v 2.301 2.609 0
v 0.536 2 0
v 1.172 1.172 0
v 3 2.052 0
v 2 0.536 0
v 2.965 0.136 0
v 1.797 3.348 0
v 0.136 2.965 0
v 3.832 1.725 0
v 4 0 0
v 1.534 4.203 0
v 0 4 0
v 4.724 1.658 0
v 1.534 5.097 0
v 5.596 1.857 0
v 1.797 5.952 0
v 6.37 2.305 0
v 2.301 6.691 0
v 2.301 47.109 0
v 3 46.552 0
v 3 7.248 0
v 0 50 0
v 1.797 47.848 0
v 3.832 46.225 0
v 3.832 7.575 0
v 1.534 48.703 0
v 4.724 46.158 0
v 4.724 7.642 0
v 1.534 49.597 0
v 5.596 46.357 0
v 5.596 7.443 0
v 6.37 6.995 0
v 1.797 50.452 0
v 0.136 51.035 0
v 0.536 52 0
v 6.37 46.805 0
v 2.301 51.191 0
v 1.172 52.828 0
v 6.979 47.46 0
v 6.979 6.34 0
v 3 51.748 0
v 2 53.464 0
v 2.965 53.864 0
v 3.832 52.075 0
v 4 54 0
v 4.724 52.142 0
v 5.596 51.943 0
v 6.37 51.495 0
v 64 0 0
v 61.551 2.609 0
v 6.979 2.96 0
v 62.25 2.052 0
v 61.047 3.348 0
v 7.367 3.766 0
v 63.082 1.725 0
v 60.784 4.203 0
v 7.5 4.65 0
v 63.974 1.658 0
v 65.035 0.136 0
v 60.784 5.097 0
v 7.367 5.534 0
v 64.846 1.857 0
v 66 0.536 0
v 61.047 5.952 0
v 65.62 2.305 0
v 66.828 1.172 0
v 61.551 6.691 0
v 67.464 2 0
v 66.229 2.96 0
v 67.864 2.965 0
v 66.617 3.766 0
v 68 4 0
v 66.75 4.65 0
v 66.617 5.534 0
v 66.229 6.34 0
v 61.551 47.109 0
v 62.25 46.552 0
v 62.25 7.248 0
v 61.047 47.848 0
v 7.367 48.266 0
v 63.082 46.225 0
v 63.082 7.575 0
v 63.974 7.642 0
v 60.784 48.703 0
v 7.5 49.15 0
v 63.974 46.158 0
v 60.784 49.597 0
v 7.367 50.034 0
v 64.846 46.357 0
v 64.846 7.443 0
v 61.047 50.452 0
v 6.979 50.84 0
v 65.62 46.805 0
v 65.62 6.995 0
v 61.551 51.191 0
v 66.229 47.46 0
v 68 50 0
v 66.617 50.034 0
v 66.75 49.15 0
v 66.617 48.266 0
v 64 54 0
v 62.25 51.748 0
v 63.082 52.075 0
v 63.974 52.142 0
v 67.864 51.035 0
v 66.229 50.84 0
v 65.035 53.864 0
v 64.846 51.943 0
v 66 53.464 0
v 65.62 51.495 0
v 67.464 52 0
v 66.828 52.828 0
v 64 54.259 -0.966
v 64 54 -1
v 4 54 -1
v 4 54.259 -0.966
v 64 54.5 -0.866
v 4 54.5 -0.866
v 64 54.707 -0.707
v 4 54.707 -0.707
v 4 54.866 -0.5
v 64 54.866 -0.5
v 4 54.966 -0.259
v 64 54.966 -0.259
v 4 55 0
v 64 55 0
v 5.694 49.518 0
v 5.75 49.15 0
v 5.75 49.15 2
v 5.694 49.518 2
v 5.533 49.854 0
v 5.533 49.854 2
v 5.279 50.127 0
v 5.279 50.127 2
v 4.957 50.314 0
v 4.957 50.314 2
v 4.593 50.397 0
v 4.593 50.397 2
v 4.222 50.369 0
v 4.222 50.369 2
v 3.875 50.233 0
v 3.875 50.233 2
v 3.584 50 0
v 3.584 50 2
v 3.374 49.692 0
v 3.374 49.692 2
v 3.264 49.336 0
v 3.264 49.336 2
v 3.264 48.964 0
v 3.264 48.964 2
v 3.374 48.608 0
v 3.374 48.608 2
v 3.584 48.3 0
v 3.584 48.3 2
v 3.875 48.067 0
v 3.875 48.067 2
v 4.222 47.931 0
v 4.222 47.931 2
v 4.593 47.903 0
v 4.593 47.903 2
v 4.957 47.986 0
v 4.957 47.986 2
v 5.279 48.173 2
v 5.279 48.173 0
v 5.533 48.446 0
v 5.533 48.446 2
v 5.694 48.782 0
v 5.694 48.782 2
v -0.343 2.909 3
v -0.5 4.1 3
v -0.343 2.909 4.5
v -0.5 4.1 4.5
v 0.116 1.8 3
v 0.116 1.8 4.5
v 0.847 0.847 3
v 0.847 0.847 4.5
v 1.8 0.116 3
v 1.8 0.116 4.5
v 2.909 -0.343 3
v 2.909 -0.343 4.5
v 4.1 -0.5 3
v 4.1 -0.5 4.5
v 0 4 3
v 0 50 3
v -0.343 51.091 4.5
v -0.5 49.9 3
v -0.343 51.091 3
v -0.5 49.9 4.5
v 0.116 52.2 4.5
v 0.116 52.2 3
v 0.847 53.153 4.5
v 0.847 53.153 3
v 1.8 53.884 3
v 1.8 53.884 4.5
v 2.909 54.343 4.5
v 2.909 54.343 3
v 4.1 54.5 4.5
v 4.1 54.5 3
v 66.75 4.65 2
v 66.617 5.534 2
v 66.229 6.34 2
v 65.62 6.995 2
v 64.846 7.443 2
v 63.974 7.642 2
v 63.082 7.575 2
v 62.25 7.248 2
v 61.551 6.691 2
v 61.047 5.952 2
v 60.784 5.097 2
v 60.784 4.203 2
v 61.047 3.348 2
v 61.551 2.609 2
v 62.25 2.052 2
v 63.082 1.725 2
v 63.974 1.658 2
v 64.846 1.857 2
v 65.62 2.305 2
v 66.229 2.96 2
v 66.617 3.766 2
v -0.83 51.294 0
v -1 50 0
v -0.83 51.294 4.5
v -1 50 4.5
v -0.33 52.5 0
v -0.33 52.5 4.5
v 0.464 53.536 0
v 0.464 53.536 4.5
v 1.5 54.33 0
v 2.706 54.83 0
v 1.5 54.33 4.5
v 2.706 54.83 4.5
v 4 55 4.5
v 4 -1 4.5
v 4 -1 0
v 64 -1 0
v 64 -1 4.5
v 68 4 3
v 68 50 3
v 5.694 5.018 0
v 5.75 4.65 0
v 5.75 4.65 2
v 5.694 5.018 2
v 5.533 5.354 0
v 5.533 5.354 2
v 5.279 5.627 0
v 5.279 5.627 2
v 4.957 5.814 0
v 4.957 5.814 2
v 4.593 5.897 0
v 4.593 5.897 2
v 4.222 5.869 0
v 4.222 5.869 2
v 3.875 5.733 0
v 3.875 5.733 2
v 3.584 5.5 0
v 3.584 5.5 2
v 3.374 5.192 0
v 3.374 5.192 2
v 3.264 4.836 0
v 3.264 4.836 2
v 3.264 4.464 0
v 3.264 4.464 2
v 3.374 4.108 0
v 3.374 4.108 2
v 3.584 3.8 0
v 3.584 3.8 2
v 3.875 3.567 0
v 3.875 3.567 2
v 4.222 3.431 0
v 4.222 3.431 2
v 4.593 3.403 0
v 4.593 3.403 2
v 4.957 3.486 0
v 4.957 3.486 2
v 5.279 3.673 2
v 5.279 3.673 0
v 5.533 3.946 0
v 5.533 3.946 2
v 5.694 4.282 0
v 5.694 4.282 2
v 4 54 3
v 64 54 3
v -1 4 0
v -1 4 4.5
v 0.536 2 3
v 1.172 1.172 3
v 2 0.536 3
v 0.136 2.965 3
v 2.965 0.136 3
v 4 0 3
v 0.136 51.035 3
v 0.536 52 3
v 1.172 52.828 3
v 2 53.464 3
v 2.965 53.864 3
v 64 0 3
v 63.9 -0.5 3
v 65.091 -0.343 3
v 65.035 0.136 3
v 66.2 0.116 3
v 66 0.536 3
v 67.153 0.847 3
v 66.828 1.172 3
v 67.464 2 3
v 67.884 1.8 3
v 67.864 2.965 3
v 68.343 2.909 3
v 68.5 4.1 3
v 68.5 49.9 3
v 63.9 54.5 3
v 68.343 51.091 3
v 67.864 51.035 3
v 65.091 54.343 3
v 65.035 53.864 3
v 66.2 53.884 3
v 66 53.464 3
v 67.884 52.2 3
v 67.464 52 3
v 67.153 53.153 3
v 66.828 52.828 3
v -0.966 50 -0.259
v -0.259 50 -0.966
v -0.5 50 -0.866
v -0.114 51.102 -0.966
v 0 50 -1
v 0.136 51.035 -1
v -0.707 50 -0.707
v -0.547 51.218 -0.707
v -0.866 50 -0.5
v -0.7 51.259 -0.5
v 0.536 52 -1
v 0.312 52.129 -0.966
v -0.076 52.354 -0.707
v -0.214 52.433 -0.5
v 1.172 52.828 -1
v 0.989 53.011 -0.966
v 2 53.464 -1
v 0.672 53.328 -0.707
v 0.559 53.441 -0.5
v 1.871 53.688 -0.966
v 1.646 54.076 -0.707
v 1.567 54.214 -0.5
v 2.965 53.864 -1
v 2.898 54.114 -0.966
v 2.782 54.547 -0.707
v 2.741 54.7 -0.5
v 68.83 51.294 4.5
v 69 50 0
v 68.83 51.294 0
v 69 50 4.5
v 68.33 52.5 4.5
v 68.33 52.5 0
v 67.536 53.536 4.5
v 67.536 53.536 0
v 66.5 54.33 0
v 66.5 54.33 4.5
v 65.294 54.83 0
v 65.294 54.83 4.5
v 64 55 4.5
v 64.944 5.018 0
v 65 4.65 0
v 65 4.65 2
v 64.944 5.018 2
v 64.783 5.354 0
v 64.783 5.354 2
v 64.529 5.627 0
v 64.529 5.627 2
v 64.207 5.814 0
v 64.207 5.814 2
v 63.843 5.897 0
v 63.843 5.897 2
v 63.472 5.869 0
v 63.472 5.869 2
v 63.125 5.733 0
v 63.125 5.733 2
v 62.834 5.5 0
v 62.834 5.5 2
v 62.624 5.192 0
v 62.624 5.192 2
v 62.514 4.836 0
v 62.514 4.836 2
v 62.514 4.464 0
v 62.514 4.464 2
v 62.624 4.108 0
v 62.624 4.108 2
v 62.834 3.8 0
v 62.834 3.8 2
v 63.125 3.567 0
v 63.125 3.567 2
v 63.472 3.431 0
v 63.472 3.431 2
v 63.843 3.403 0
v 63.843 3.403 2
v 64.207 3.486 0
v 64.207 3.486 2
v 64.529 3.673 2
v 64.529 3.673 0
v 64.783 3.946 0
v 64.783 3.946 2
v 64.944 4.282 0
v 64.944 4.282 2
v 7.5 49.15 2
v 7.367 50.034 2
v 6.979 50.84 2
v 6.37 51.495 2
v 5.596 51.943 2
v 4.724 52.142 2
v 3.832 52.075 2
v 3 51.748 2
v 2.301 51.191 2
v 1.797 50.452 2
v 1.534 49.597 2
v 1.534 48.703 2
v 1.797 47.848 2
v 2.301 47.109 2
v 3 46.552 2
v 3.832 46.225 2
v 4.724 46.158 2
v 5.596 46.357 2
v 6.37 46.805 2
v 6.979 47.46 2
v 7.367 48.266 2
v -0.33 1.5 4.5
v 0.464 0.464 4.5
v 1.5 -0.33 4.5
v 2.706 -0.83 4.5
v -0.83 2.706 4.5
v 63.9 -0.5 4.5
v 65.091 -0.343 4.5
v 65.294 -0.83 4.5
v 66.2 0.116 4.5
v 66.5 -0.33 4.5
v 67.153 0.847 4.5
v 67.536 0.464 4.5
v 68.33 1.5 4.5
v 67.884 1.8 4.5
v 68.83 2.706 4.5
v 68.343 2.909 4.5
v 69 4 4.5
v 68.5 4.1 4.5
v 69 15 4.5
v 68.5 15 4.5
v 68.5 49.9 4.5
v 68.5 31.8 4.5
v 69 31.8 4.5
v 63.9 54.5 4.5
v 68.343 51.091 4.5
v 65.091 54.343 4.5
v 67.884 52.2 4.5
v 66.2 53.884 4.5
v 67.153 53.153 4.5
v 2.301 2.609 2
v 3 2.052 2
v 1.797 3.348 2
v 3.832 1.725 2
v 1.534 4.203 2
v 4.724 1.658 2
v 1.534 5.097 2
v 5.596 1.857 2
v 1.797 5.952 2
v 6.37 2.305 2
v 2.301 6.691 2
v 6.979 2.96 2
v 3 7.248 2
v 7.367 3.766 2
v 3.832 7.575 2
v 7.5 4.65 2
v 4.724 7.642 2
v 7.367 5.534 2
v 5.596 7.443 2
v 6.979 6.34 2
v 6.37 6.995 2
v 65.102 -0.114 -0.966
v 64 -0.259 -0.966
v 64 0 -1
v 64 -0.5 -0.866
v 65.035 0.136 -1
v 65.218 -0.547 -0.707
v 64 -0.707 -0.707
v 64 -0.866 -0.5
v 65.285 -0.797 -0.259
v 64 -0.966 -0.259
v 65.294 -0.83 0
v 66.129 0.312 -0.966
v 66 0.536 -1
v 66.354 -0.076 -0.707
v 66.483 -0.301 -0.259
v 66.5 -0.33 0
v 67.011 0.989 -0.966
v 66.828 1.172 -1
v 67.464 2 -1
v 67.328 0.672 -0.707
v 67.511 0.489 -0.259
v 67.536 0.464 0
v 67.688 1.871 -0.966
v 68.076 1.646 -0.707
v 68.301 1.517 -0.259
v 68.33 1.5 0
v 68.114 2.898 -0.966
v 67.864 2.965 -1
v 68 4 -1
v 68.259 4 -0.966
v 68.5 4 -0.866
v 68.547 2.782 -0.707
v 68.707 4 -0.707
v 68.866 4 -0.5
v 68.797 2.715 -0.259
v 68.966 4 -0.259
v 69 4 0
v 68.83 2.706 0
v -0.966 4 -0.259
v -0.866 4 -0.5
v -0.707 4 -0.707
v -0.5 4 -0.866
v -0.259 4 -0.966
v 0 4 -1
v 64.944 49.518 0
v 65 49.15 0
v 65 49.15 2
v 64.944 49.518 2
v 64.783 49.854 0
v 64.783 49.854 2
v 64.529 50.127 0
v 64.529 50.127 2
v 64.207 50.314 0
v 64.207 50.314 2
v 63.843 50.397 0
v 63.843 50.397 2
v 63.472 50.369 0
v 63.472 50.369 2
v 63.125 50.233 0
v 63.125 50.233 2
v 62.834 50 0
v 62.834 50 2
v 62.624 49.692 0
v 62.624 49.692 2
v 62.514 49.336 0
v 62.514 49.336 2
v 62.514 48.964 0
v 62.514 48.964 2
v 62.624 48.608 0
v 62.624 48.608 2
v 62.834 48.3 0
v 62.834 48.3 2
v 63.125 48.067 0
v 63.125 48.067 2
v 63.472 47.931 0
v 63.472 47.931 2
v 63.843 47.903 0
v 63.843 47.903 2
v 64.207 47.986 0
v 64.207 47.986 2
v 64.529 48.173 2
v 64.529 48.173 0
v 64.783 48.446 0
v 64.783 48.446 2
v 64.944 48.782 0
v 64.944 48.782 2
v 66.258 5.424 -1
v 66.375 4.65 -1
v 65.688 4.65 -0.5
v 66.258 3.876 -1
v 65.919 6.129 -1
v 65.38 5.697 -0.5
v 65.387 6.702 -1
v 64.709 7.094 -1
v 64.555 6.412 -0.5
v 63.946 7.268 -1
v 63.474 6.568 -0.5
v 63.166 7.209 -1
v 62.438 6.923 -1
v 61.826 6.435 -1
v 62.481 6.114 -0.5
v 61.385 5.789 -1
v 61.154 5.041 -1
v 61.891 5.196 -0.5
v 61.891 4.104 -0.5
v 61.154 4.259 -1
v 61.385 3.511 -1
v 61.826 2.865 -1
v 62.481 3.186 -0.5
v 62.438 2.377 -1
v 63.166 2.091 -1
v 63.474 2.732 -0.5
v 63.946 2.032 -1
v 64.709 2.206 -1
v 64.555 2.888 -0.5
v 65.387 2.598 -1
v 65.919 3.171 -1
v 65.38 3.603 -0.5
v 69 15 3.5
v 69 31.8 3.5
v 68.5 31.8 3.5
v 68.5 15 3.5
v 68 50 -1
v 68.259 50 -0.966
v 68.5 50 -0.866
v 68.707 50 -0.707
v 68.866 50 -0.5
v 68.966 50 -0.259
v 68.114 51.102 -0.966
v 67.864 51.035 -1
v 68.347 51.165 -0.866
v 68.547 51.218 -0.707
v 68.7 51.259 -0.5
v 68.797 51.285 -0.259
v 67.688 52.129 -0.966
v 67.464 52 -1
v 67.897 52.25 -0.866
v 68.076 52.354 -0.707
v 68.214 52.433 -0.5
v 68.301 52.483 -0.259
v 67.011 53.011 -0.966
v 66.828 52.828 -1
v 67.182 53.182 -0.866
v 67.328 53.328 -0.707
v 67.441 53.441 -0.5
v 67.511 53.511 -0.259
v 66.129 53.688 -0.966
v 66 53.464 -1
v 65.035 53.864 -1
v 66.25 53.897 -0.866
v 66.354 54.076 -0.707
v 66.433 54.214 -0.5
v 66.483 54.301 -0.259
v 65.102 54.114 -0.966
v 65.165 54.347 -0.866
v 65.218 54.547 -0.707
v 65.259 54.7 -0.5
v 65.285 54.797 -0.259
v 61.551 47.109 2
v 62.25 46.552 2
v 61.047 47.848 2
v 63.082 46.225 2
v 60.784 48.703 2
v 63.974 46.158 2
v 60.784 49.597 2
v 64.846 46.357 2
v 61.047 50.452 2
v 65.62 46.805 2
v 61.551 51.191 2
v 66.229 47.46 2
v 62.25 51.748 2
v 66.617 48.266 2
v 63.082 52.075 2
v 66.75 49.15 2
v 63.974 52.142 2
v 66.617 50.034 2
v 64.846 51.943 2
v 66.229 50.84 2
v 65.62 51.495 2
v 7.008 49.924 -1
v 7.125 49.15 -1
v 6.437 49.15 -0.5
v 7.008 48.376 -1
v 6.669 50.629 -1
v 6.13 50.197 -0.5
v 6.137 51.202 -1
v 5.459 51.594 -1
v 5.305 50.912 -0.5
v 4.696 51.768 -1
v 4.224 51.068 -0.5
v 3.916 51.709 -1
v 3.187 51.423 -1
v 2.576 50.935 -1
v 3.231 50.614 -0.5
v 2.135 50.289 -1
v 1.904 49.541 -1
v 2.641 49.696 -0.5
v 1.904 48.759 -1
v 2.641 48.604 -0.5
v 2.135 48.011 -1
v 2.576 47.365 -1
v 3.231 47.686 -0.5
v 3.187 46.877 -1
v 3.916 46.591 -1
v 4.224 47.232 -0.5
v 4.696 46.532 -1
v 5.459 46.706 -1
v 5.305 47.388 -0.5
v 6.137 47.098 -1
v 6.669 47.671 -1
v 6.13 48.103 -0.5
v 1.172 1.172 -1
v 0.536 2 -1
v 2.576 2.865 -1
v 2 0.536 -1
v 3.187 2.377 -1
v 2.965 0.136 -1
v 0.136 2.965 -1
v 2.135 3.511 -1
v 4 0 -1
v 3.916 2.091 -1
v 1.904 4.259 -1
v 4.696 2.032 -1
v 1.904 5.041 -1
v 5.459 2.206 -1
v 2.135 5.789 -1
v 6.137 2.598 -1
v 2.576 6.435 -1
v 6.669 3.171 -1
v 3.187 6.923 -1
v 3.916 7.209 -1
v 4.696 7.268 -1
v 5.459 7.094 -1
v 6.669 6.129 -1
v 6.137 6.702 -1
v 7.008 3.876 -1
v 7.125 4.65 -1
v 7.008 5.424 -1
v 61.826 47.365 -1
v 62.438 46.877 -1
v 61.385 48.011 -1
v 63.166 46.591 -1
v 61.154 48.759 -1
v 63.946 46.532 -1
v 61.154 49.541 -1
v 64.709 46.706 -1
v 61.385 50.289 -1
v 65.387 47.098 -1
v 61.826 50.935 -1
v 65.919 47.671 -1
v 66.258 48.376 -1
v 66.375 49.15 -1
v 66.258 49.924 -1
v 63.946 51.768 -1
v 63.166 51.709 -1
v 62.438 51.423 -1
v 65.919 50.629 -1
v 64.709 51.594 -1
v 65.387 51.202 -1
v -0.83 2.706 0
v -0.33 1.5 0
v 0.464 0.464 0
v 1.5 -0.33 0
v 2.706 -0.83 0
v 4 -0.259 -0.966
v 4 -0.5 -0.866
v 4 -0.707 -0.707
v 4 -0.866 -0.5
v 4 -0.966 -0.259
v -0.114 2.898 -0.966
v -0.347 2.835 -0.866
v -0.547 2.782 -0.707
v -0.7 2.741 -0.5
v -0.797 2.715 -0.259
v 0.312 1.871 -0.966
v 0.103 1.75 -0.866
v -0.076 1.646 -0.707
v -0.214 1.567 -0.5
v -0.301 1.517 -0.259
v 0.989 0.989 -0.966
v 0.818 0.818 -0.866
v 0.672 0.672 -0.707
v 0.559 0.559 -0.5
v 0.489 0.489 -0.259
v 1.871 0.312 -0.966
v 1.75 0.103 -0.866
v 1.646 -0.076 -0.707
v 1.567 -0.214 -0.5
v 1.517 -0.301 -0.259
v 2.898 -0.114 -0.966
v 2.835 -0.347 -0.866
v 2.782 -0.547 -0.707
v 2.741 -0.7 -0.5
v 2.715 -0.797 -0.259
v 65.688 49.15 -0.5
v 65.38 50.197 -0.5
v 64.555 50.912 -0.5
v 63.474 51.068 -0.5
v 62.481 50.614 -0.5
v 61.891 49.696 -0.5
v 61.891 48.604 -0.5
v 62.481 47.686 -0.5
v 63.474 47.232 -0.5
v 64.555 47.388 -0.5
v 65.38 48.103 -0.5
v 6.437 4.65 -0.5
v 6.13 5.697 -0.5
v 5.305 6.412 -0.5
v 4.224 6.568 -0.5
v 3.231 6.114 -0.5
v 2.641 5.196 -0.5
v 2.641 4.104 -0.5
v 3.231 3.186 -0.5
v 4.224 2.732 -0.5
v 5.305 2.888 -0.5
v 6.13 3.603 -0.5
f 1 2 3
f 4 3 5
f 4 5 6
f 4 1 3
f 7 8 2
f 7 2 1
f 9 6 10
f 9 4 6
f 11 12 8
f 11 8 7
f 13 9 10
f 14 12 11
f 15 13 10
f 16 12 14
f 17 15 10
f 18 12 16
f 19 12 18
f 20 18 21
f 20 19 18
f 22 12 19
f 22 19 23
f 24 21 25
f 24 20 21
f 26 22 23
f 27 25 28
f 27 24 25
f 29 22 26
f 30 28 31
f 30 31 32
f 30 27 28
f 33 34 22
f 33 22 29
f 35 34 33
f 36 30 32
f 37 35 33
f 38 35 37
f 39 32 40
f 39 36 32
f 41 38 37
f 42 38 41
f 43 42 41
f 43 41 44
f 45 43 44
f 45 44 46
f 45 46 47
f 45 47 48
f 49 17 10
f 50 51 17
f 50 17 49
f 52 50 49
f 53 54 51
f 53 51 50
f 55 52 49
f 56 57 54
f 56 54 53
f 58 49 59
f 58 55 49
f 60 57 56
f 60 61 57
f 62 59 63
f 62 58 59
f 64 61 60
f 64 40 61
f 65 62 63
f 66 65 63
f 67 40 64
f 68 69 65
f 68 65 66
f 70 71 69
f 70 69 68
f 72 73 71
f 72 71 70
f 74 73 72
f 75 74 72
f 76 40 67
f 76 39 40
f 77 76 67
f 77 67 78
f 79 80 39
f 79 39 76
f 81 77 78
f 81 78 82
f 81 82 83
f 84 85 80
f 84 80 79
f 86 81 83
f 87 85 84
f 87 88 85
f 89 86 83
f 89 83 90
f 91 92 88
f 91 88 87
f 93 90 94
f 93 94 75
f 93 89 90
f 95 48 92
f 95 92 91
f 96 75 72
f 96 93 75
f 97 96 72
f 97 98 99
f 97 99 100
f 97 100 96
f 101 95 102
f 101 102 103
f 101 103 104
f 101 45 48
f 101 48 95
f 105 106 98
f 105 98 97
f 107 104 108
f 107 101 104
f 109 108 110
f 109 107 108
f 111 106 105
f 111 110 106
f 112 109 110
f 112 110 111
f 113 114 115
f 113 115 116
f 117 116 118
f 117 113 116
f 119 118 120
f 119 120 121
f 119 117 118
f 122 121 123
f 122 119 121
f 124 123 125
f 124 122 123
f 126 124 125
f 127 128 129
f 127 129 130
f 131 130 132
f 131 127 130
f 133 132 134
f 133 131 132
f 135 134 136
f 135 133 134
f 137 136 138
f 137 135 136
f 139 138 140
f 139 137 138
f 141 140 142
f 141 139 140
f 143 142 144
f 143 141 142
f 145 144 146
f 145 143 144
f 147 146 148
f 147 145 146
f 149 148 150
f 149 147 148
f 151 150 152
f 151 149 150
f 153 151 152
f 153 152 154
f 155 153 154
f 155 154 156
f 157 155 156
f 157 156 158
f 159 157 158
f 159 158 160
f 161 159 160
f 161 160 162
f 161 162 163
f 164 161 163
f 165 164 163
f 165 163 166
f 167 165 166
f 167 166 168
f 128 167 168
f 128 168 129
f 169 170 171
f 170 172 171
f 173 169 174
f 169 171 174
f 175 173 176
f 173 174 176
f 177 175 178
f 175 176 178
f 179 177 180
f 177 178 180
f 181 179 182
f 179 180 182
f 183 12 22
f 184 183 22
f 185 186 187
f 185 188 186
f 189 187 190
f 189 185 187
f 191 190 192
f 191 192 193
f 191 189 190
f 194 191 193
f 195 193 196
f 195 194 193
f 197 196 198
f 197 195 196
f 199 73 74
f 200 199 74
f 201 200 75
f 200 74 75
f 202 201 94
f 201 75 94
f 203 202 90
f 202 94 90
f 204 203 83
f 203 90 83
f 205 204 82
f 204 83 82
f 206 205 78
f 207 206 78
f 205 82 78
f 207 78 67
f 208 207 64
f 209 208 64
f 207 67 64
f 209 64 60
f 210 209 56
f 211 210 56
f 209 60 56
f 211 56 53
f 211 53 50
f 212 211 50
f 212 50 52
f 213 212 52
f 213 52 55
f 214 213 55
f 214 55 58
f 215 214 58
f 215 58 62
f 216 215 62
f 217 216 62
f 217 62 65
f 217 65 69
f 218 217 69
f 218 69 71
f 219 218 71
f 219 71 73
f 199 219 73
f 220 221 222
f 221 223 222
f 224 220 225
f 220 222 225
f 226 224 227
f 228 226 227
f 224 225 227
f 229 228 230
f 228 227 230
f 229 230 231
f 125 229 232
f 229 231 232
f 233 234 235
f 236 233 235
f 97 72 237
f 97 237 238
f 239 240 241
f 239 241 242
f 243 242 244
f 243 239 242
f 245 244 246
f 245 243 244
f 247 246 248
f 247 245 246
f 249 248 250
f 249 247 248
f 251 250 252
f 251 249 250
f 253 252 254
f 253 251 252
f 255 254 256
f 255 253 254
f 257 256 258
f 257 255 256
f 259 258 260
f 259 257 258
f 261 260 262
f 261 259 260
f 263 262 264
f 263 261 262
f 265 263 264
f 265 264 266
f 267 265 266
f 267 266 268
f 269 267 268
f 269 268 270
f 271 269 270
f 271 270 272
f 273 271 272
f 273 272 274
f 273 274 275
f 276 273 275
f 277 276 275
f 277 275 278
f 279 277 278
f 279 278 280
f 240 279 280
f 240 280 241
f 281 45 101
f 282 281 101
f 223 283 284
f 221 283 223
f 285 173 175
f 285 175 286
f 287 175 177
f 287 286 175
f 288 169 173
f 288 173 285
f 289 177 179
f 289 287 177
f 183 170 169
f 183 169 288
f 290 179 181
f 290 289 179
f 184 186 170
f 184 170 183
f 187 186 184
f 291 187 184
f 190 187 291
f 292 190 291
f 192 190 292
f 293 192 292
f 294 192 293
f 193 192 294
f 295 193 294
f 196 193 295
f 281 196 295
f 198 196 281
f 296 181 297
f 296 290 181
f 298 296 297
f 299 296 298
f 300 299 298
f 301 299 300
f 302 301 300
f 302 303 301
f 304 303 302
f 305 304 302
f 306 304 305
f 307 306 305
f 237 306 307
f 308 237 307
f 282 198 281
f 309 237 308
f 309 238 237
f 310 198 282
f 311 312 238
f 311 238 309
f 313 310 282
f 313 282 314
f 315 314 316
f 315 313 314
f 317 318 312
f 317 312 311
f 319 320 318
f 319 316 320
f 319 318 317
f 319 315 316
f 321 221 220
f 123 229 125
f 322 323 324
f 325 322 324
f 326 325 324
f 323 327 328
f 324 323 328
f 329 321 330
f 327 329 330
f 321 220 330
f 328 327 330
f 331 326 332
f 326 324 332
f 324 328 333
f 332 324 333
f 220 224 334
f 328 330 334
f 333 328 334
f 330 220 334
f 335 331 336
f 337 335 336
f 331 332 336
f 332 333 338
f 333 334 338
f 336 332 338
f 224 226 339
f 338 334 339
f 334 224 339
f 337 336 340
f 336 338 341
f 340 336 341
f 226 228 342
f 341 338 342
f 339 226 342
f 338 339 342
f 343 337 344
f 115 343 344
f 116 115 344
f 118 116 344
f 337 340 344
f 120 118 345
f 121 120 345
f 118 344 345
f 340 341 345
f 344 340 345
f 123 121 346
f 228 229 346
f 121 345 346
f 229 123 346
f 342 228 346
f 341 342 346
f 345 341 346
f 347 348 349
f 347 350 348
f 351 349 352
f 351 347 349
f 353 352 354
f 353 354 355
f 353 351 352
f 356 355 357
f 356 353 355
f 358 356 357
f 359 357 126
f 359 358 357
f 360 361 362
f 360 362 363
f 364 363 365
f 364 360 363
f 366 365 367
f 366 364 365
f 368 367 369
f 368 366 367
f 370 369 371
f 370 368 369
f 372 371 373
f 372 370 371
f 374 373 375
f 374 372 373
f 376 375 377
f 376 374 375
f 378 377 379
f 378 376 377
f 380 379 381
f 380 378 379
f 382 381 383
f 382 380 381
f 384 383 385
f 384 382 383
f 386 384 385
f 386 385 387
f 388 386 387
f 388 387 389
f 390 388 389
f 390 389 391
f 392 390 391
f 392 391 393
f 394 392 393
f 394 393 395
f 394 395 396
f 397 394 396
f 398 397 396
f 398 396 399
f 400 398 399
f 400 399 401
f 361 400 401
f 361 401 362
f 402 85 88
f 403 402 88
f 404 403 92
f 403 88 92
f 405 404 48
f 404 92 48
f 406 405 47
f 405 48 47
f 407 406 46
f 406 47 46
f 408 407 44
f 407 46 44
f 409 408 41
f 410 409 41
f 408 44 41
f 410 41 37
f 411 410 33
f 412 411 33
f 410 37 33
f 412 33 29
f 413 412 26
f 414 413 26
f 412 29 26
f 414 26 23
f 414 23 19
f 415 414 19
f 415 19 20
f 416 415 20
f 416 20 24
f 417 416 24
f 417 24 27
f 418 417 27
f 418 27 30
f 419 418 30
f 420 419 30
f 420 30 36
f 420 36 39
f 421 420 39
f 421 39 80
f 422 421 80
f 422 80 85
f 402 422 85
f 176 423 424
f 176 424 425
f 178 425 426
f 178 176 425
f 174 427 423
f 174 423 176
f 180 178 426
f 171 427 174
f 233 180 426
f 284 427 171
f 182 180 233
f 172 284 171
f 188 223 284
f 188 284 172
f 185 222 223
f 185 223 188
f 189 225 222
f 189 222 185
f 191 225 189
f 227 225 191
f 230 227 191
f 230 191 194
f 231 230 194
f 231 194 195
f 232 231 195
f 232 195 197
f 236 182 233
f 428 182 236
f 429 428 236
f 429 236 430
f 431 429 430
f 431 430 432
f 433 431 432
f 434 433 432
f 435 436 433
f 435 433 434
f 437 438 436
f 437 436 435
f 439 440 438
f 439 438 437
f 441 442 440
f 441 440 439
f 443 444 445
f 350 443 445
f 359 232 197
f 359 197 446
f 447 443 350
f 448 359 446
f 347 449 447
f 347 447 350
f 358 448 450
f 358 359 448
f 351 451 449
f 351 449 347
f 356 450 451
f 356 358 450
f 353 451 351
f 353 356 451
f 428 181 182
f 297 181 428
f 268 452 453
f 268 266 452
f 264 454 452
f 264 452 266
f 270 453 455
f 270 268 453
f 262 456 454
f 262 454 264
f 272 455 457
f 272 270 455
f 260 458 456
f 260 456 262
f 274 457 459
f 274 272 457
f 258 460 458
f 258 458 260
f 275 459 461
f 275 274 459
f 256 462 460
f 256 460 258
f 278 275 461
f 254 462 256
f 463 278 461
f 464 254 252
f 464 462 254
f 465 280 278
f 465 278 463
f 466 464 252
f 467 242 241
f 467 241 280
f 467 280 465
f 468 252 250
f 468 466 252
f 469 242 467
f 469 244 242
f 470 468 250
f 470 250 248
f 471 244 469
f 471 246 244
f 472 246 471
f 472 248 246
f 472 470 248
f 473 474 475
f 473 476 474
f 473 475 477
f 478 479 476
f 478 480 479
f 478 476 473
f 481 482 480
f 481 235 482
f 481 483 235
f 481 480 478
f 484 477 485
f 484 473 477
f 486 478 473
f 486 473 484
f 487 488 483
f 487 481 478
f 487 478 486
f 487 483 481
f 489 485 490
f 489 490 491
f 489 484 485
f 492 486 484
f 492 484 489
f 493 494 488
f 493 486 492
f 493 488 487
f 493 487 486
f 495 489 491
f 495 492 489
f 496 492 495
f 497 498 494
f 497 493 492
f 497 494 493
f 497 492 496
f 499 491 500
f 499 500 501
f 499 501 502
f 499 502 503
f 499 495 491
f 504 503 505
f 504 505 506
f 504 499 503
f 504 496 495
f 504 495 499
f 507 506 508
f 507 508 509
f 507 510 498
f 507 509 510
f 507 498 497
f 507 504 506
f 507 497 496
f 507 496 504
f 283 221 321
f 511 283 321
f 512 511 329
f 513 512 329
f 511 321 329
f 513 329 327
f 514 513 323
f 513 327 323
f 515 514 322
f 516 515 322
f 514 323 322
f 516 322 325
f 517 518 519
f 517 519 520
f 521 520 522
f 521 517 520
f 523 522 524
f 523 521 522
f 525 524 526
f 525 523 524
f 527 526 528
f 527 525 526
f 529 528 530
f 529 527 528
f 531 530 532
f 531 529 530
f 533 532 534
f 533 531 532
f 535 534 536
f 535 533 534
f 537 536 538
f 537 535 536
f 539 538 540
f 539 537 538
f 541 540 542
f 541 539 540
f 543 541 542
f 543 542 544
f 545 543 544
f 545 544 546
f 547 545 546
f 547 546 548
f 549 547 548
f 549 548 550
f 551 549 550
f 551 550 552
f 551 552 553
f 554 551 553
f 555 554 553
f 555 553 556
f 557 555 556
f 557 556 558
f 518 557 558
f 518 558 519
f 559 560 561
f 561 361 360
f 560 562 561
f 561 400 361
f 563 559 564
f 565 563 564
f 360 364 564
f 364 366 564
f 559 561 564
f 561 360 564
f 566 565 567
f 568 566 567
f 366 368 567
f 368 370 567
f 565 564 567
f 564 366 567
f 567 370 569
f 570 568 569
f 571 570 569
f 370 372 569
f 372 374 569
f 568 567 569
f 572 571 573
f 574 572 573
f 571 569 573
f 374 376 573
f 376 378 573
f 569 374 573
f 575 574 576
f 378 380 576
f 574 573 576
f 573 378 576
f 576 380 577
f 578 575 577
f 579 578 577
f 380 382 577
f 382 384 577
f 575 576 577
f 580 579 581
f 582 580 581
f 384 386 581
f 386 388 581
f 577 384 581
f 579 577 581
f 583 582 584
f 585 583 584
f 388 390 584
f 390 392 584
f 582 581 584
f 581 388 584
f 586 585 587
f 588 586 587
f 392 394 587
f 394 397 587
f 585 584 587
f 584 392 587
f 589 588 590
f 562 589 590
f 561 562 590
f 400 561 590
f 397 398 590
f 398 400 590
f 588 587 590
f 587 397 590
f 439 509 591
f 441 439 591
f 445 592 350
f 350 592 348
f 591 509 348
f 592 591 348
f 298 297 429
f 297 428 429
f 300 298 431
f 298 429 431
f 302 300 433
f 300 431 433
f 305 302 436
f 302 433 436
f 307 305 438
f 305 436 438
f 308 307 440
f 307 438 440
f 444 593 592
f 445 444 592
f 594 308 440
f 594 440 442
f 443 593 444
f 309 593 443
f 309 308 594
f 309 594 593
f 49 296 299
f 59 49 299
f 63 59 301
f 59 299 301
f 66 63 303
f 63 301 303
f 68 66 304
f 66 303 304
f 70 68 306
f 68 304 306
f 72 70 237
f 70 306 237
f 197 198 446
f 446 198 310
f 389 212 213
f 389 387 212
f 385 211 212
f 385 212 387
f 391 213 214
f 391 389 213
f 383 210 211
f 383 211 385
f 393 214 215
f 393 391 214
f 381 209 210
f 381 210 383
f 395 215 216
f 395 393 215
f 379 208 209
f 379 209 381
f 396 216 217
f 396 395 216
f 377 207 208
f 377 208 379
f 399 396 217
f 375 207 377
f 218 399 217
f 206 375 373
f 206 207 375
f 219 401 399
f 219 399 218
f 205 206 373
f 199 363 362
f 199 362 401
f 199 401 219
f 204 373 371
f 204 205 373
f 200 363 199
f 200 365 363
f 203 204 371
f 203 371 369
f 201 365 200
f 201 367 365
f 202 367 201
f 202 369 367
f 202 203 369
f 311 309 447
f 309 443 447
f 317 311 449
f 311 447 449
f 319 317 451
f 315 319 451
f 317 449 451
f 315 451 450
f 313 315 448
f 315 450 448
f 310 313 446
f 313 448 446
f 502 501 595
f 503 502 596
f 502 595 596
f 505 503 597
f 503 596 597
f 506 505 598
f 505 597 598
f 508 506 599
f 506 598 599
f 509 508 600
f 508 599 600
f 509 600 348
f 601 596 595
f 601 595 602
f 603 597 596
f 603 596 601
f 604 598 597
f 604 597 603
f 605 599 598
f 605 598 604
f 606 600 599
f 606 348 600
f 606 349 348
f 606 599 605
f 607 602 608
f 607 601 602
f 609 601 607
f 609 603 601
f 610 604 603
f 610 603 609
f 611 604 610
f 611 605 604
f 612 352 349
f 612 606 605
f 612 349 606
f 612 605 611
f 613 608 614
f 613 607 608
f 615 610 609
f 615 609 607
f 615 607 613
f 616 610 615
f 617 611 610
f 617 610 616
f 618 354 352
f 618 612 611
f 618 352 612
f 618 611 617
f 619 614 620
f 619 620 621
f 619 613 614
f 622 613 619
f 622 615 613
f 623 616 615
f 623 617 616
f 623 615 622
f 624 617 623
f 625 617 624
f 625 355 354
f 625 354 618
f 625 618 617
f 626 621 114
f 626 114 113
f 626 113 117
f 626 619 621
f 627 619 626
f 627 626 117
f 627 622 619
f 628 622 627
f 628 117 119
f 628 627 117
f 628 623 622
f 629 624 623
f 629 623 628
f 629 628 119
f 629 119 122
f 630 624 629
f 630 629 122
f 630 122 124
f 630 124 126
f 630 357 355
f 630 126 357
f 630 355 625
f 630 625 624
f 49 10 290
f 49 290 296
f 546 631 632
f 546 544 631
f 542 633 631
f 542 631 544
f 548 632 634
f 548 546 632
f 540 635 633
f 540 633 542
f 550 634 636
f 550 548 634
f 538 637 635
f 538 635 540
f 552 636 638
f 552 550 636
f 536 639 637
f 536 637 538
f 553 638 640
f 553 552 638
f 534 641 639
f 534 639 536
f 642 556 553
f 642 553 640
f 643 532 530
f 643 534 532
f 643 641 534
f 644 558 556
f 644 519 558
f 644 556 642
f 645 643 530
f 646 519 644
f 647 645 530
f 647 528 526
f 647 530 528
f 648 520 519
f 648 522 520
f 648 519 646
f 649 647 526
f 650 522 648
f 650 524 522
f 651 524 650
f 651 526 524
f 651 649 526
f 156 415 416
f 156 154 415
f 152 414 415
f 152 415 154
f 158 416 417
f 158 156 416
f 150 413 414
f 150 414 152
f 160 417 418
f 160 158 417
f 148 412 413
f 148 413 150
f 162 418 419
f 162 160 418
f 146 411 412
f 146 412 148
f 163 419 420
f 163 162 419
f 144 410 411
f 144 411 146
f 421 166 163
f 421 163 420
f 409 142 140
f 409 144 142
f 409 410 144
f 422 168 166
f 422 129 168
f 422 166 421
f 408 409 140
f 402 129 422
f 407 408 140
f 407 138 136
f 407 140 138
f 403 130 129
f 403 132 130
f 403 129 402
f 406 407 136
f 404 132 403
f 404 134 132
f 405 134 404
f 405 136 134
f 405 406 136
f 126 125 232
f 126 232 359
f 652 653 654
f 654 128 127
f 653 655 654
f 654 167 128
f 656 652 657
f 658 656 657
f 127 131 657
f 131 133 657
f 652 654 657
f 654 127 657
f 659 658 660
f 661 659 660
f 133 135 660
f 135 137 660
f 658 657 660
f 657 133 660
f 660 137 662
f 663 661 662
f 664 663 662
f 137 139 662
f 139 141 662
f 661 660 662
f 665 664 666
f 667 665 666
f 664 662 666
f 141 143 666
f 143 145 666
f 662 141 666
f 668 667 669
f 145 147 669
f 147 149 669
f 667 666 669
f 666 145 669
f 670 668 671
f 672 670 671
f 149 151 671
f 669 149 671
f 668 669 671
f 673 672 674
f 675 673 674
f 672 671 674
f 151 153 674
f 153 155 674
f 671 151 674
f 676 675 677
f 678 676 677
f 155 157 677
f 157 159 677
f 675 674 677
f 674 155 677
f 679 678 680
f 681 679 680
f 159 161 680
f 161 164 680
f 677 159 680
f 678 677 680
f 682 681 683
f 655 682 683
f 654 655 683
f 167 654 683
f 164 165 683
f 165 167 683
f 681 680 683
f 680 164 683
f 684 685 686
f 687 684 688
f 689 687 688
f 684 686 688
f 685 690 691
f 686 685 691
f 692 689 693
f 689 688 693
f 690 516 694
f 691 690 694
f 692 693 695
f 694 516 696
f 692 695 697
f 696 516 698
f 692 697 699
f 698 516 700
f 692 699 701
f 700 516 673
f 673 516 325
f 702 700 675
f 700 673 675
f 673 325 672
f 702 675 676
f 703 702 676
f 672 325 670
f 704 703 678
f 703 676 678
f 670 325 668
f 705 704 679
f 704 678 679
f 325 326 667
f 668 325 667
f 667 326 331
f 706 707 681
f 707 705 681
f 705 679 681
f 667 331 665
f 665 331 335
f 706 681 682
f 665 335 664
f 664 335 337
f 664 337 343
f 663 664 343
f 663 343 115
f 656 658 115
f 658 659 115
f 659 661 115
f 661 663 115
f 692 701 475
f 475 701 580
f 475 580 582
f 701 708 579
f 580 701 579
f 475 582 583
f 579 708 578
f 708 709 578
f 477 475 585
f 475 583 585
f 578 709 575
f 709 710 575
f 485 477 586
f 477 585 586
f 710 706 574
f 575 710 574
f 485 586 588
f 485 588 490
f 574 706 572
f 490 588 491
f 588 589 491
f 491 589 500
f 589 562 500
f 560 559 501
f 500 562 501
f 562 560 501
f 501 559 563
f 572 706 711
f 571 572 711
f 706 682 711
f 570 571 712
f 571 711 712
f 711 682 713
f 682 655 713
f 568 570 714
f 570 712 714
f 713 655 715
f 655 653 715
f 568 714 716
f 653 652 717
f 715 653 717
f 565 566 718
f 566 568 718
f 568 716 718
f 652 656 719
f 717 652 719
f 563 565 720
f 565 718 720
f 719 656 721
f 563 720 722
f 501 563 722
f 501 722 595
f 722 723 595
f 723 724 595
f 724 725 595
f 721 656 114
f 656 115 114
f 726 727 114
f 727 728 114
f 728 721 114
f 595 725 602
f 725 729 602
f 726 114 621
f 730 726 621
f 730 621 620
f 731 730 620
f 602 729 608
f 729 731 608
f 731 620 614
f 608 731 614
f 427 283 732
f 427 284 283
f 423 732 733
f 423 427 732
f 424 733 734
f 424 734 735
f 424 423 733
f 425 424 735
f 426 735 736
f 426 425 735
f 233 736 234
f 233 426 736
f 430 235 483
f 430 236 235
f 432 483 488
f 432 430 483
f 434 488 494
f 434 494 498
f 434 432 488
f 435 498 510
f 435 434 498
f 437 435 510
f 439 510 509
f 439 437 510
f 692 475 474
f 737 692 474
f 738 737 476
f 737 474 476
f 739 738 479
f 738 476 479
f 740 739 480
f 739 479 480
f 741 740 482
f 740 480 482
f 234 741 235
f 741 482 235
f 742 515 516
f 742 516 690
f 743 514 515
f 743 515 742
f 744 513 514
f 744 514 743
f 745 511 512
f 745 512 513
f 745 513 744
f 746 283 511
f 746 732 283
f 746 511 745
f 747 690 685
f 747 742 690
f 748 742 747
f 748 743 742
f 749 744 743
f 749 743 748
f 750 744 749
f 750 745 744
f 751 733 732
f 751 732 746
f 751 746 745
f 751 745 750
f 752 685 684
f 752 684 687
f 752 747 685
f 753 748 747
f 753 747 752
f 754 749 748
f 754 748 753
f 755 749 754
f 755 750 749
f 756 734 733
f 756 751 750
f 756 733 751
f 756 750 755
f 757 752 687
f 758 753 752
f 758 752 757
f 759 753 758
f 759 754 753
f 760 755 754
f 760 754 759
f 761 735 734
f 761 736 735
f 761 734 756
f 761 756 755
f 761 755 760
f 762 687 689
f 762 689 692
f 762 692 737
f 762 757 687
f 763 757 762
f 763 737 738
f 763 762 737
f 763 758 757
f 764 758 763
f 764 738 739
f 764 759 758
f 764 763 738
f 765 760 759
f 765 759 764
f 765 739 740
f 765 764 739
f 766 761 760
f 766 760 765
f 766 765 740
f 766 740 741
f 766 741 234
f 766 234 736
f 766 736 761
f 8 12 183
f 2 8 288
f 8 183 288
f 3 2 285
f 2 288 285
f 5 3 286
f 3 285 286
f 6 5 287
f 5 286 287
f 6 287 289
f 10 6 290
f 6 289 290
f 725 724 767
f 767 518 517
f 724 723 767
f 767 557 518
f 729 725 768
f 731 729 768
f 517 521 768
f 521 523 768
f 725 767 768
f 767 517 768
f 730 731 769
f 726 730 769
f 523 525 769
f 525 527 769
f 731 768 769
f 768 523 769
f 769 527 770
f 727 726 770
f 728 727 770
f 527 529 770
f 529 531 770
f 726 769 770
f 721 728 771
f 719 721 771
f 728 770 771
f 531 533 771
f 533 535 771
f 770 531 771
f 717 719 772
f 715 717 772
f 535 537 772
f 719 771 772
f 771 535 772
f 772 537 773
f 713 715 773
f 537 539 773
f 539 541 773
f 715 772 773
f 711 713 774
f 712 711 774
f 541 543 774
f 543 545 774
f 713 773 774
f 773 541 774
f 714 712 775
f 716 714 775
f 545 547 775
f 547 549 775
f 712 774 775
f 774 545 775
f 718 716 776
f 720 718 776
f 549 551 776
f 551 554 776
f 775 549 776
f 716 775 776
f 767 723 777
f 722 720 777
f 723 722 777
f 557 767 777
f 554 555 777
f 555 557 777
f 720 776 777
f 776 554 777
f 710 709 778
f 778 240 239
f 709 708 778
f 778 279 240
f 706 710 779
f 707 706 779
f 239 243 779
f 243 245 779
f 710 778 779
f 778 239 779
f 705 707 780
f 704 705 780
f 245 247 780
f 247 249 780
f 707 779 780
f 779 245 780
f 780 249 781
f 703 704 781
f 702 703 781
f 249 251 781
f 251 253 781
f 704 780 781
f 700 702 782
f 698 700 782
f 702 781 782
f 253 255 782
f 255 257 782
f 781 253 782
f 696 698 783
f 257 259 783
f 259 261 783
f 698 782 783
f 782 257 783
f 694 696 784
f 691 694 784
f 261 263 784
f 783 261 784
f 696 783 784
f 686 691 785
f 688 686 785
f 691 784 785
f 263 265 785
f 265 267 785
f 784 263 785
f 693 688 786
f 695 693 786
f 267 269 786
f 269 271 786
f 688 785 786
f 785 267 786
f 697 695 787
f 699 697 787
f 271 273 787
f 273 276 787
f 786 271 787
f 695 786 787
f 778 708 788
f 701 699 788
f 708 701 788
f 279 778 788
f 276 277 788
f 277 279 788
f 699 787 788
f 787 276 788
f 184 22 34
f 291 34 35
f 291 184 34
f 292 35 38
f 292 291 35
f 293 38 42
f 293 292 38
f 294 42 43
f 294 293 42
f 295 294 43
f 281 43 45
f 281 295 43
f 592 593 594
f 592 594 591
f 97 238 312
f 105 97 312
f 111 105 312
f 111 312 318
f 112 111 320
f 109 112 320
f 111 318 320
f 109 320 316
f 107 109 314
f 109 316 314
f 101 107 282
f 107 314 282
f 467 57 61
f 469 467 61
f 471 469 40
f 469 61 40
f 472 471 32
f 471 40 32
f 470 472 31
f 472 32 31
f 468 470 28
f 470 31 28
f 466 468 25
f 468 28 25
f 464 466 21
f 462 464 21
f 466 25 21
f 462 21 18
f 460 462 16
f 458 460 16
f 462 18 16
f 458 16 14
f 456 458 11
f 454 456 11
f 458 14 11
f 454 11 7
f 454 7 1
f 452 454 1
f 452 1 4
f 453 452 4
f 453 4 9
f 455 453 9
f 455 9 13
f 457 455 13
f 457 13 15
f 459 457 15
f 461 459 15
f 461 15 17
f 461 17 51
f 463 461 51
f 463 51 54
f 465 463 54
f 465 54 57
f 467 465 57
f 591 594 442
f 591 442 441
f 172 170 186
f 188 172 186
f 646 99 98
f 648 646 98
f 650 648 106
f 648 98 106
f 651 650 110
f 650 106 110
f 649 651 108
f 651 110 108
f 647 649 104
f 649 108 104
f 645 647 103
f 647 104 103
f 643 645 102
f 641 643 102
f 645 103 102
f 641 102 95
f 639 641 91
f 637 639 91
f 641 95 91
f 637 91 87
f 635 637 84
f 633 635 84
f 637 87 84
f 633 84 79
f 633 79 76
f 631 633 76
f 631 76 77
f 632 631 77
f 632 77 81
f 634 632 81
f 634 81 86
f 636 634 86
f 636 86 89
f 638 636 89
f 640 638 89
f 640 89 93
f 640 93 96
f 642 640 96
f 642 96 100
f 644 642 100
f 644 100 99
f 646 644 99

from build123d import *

# Parameters (mm, degrees)
BOX012_W          = 69
BOX012_H          = 55
BOX012_DEPTH      = 1.5
FILLET004_R       = 4.6
CYLINDER005_R     = 1.25
CYLINDER005_DEPTH = 4
CYLINDER007_R     = 1.25
CYLINDER007_DEPTH = 4
CYLINDER009_R     = 1.25
CYLINDER009_DEPTH = 4
CYLINDER003_R     = 1.25
CYLINDER003_DEPTH = 4
BOX015_W          = 24
BOX015_H          = 16.8
BOX015_DEPTH      = 18
CYLINDER006_R     = 3
CYLINDER006_DEPTH = 3
CYLINDER008_R     = 3
CYLINDER008_DEPTH = 3
CYLINDER010_R     = 3
CYLINDER010_DEPTH = 3
BOX_W             = 68
BOX_H             = 54
BOX_DEPTH         = 4.5
FILLET006_R       = 4
THICKNESS_T       = 1
CYLINDER004_R     = 3
CYLINDER004_DEPTH = 3


with BuildPart() as snapbottom001:
    # Box012 → Box012 (new body)
    with BuildSketch(Plane(origin=(-0.5, -0.5, 3), x_dir=(1, 0, 0), z_dir=(0, 0, 1))):
        with Locations((34.5, 27.5)):
            Rectangle(BOX012_W, BOX012_H)
    extrude(amount=BOX012_DEPTH)

    # Fillet004
    fillet004_edges = [snapbottom001.edges().sort_by_distance(p)[0] for p in [
        (-0.5, -0.5, 3.75),
        (-0.5, 54.5, 3.75),
        (68.5, -0.5, 3.75),
        (68.5, 54.5, 3.75),
    ]]
    fillet(fillet004_edges, radius=FILLET004_R)


with BuildPart() as screwcone001:
    # Cone001 → Cone001 (revolve)
    with BuildSketch(Plane(origin=(4.5, 49.15, -2), x_dir=(1, 0, 0), z_dir=(0, -1, 0))):
        Polygon((0, 0), (4, 0), (1.25, 2), (0, 2), align=None)
    revolve(axis=Axis((4.5, 49.15, -2), (0, 0, 1)))


with BuildPart() as screwcone002:
    # Cone002 → Cone002 (revolve)
    with BuildSketch(Plane(origin=(63.75, 49.15, -2), x_dir=(1, 0, 0), z_dir=(0, -1, 0))):
        Polygon((0, 0), (4, 0), (1.25, 2), (0, 2), align=None)
    revolve(axis=Axis((63.75, 49.15, -2), (0, 0, 1)))


with BuildPart() as screwcone003:
    # Cone003 → Cone003 (revolve)
    with BuildSketch(Plane(origin=(63.75, 4.65, -2), x_dir=(1, 0, 0), z_dir=(0, -1, 0))):
        Polygon((0, 0), (4, 0), (1.25, 2), (0, 2), align=None)
    revolve(axis=Axis((63.75, 4.65, -2), (0, 0, 1)))


with BuildPart() as holetl:
    # Cylinder005 → Cylinder005 (new body)
    with BuildSketch(Plane(origin=(4.5, 49.15, -2), x_dir=(1, 0, 0), z_dir=(0, 0, 1))):
        Circle(CYLINDER005_R)
    extrude(amount=CYLINDER005_DEPTH)


with BuildPart() as holebr:
    # Cylinder007 → Cylinder007 (new body)
    with BuildSketch(Plane(origin=(63.75, 4.65, -2), x_dir=(1, 0, 0), z_dir=(0, 0, 1))):
        Circle(CYLINDER007_R)
    extrude(amount=CYLINDER007_DEPTH)


with BuildPart() as holetr:
    # Cylinder009 → Cylinder009 (new body)
    with BuildSketch(Plane(origin=(63.75, 49.15, -2), x_dir=(1, 0, 0), z_dir=(0, 0, 1))):
        Circle(CYLINDER009_R)
    extrude(amount=CYLINDER009_DEPTH)


with BuildPart() as holebl:
    # Cylinder003 → Cylinder003 (new body)
    with BuildSketch(Plane(origin=(4.5, 4.65, -2), x_dir=(1, 0, 0), z_dir=(0, 0, 1))):
        Circle(CYLINDER003_R)
    extrude(amount=CYLINDER003_DEPTH)


with BuildPart() as bottomscrewholes:
    # Cone → Cone (revolve)
    with BuildSketch(Plane(origin=(4.5, 4.65, -2), x_dir=(1, 0, 0), z_dir=(0, -1, 0))):
        Polygon((0, 0), (4, 0), (1.25, 2), (0, 2), align=None)
    revolve(axis=Axis((4.5, 4.65, -2), (0, 0, 1)))

    # Fusion001: union ScrewCone001, ScrewCone002, ScrewCone003, holetl, holebr, holetr, holebl
    add(screwcone001.part)
    add(screwcone002.part)
    add(screwcone003.part)
    add(holetl.part)
    add(holebr.part)
    add(holetr.part)
    add(holebl.part)


with BuildPart() as bottomholes:
    # Box015 → Box015 (new body)
    with BuildSketch(Plane(origin=(47, 15, 3.5), x_dir=(1, 0, 0), z_dir=(0, 0, 1))):
        with Locations((12, 8.4)):
            Rectangle(BOX015_W, BOX015_H)
    extrude(amount=BOX015_DEPTH)

    # Fusion007: union snapbottom001, BottomScrewHoles
    add(snapbottom001.part)
    add(bottomscrewholes.part)


with BuildPart() as supporttl:
    # Cylinder006 → Cylinder006 (new body)
    with BuildSketch(Plane(origin=(4.5, 49.15, -1), x_dir=(1, 0, 0), z_dir=(0, 0, 1))):
        Circle(CYLINDER006_R)
    extrude(amount=CYLINDER006_DEPTH)


with BuildPart() as supportbr:
    # Cylinder008 → Cylinder008 (new body)
    with BuildSketch(Plane(origin=(63.75, 4.65, -1), x_dir=(1, 0, 0), z_dir=(0, 0, 1))):
        Circle(CYLINDER008_R)
    extrude(amount=CYLINDER008_DEPTH)


with BuildPart() as supporttr:
    # Cylinder010 → Cylinder010 (new body)
    with BuildSketch(Plane(origin=(63.75, 49.15, -1), x_dir=(1, 0, 0), z_dir=(0, 0, 1))):
        Circle(CYLINDER010_R)
    extrude(amount=CYLINDER010_DEPTH)


with BuildPart() as thickness:
    # Box → Box (new body)
    with BuildSketch(Plane.XY):
        with Locations((34, 27)):
            Rectangle(BOX_W, BOX_H)
    extrude(amount=BOX_DEPTH)

    # Fillet006
    fillet006_edges = [thickness.edges().sort_by_distance(p)[0] for p in [
        (0, 0, 2.25),
        (0, 54, 2.25),
        (68, 0, 2.25),
        (68, 54, 2.25),
    ]]
    fillet(fillet006_edges, radius=FILLET006_R)

    # Thickness
    thickness_openings = [thickness.faces().sort_by_distance(p)[0] for p in [
        (34, 27, 4.5),
    ]]
    offset(amount=THICKNESS_T, openings=thickness_openings)


with BuildPart() as bottom:
    # Cylinder004 → Cylinder004 (new body)
    with BuildSketch(Plane(origin=(4.5, 4.65, -1), x_dir=(1, 0, 0), z_dir=(0, 0, 1))):
        Circle(CYLINDER004_R)
    extrude(amount=CYLINDER004_DEPTH)

    # Fusion006: union supporttl, supportbr, supporttr, Thickness
    add(supporttl.part)
    add(supportbr.part)
    add(supporttr.part)
    add(thickness.part)

    # Cut003: cut BottomHoles
    add(bottomholes.part, mode=Mode.SUBTRACT)


solid = bottom.part
